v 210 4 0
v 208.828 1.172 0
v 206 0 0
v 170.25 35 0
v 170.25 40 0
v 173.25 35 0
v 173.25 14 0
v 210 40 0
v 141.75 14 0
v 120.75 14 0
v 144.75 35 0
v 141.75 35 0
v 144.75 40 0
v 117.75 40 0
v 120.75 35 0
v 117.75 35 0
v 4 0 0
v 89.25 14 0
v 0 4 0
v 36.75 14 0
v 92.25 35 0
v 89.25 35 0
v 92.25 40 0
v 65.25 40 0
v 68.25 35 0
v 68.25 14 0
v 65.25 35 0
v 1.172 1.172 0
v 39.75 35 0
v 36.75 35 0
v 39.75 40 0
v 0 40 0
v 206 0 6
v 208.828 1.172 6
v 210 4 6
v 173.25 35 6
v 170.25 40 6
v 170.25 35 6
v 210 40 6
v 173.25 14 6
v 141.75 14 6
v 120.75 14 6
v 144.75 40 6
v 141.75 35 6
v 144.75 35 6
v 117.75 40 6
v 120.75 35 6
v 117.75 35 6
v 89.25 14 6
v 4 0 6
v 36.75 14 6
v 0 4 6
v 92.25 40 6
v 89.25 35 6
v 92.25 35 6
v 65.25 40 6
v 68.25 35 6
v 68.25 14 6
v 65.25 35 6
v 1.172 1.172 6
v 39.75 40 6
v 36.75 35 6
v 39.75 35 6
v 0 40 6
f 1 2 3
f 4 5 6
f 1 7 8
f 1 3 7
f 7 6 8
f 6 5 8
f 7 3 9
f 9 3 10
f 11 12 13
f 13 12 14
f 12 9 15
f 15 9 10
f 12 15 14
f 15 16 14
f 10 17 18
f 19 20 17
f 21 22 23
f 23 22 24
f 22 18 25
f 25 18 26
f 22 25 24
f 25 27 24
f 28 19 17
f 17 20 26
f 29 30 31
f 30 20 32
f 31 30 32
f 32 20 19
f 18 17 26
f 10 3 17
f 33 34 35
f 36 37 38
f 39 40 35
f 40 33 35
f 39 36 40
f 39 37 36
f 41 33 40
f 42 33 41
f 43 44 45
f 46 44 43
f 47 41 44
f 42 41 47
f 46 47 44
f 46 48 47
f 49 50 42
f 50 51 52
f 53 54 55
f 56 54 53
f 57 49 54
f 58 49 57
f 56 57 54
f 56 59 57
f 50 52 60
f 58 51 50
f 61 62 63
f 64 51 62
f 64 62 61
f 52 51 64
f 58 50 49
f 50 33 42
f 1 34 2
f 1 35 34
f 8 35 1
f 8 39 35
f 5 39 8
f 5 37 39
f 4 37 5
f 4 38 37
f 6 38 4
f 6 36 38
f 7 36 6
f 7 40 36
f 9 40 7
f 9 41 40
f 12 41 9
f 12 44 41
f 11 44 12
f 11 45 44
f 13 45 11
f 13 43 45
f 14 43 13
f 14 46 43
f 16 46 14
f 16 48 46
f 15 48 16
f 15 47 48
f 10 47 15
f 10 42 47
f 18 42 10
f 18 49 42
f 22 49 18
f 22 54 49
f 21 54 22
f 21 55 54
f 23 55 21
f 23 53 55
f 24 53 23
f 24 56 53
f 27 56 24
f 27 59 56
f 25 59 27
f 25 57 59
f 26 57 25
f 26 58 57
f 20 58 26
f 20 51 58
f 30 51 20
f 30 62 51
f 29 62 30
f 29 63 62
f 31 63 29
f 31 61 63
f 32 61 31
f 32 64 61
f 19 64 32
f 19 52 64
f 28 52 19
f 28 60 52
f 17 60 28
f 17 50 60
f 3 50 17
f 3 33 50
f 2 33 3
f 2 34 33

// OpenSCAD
$fn = 32;

// ----------------------------------------------------------------------
// Oversize slot bar: 210 mm bar with 3 oversize windows
// ----------------------------------------------------------------------

// --- parameters (mm) ---
profile_height = 6;       // extrusion height
profile_points = 32;      // points of the closed outline

profile = [[0, 4], [1.172, 1.172], [4, 0], [206, 0], [208.828, 1.172], [210, 4], [210, 40], [170.25, 40], [170.25, 35], [173.25, 35], [173.25, 14], [141.75, 14], [141.75, 35], [144.75, 35], [144.75, 40], [117.75, 40], [117.75, 35], [120.75, 35], [120.75, 14], [89.25, 14], [89.25, 35], [92.25, 35], [92.25, 40], [65.25, 40], [65.25, 35], [68.25, 35], [68.25, 14], [36.75, 14], [36.75, 35], [39.75, 35], [39.75, 40], [0, 40]];  // single closed polygon, 32 points, counter clockwise

// --- the one profile operation ---
linear_extrude(height = profile_height) polygon(points = profile);
